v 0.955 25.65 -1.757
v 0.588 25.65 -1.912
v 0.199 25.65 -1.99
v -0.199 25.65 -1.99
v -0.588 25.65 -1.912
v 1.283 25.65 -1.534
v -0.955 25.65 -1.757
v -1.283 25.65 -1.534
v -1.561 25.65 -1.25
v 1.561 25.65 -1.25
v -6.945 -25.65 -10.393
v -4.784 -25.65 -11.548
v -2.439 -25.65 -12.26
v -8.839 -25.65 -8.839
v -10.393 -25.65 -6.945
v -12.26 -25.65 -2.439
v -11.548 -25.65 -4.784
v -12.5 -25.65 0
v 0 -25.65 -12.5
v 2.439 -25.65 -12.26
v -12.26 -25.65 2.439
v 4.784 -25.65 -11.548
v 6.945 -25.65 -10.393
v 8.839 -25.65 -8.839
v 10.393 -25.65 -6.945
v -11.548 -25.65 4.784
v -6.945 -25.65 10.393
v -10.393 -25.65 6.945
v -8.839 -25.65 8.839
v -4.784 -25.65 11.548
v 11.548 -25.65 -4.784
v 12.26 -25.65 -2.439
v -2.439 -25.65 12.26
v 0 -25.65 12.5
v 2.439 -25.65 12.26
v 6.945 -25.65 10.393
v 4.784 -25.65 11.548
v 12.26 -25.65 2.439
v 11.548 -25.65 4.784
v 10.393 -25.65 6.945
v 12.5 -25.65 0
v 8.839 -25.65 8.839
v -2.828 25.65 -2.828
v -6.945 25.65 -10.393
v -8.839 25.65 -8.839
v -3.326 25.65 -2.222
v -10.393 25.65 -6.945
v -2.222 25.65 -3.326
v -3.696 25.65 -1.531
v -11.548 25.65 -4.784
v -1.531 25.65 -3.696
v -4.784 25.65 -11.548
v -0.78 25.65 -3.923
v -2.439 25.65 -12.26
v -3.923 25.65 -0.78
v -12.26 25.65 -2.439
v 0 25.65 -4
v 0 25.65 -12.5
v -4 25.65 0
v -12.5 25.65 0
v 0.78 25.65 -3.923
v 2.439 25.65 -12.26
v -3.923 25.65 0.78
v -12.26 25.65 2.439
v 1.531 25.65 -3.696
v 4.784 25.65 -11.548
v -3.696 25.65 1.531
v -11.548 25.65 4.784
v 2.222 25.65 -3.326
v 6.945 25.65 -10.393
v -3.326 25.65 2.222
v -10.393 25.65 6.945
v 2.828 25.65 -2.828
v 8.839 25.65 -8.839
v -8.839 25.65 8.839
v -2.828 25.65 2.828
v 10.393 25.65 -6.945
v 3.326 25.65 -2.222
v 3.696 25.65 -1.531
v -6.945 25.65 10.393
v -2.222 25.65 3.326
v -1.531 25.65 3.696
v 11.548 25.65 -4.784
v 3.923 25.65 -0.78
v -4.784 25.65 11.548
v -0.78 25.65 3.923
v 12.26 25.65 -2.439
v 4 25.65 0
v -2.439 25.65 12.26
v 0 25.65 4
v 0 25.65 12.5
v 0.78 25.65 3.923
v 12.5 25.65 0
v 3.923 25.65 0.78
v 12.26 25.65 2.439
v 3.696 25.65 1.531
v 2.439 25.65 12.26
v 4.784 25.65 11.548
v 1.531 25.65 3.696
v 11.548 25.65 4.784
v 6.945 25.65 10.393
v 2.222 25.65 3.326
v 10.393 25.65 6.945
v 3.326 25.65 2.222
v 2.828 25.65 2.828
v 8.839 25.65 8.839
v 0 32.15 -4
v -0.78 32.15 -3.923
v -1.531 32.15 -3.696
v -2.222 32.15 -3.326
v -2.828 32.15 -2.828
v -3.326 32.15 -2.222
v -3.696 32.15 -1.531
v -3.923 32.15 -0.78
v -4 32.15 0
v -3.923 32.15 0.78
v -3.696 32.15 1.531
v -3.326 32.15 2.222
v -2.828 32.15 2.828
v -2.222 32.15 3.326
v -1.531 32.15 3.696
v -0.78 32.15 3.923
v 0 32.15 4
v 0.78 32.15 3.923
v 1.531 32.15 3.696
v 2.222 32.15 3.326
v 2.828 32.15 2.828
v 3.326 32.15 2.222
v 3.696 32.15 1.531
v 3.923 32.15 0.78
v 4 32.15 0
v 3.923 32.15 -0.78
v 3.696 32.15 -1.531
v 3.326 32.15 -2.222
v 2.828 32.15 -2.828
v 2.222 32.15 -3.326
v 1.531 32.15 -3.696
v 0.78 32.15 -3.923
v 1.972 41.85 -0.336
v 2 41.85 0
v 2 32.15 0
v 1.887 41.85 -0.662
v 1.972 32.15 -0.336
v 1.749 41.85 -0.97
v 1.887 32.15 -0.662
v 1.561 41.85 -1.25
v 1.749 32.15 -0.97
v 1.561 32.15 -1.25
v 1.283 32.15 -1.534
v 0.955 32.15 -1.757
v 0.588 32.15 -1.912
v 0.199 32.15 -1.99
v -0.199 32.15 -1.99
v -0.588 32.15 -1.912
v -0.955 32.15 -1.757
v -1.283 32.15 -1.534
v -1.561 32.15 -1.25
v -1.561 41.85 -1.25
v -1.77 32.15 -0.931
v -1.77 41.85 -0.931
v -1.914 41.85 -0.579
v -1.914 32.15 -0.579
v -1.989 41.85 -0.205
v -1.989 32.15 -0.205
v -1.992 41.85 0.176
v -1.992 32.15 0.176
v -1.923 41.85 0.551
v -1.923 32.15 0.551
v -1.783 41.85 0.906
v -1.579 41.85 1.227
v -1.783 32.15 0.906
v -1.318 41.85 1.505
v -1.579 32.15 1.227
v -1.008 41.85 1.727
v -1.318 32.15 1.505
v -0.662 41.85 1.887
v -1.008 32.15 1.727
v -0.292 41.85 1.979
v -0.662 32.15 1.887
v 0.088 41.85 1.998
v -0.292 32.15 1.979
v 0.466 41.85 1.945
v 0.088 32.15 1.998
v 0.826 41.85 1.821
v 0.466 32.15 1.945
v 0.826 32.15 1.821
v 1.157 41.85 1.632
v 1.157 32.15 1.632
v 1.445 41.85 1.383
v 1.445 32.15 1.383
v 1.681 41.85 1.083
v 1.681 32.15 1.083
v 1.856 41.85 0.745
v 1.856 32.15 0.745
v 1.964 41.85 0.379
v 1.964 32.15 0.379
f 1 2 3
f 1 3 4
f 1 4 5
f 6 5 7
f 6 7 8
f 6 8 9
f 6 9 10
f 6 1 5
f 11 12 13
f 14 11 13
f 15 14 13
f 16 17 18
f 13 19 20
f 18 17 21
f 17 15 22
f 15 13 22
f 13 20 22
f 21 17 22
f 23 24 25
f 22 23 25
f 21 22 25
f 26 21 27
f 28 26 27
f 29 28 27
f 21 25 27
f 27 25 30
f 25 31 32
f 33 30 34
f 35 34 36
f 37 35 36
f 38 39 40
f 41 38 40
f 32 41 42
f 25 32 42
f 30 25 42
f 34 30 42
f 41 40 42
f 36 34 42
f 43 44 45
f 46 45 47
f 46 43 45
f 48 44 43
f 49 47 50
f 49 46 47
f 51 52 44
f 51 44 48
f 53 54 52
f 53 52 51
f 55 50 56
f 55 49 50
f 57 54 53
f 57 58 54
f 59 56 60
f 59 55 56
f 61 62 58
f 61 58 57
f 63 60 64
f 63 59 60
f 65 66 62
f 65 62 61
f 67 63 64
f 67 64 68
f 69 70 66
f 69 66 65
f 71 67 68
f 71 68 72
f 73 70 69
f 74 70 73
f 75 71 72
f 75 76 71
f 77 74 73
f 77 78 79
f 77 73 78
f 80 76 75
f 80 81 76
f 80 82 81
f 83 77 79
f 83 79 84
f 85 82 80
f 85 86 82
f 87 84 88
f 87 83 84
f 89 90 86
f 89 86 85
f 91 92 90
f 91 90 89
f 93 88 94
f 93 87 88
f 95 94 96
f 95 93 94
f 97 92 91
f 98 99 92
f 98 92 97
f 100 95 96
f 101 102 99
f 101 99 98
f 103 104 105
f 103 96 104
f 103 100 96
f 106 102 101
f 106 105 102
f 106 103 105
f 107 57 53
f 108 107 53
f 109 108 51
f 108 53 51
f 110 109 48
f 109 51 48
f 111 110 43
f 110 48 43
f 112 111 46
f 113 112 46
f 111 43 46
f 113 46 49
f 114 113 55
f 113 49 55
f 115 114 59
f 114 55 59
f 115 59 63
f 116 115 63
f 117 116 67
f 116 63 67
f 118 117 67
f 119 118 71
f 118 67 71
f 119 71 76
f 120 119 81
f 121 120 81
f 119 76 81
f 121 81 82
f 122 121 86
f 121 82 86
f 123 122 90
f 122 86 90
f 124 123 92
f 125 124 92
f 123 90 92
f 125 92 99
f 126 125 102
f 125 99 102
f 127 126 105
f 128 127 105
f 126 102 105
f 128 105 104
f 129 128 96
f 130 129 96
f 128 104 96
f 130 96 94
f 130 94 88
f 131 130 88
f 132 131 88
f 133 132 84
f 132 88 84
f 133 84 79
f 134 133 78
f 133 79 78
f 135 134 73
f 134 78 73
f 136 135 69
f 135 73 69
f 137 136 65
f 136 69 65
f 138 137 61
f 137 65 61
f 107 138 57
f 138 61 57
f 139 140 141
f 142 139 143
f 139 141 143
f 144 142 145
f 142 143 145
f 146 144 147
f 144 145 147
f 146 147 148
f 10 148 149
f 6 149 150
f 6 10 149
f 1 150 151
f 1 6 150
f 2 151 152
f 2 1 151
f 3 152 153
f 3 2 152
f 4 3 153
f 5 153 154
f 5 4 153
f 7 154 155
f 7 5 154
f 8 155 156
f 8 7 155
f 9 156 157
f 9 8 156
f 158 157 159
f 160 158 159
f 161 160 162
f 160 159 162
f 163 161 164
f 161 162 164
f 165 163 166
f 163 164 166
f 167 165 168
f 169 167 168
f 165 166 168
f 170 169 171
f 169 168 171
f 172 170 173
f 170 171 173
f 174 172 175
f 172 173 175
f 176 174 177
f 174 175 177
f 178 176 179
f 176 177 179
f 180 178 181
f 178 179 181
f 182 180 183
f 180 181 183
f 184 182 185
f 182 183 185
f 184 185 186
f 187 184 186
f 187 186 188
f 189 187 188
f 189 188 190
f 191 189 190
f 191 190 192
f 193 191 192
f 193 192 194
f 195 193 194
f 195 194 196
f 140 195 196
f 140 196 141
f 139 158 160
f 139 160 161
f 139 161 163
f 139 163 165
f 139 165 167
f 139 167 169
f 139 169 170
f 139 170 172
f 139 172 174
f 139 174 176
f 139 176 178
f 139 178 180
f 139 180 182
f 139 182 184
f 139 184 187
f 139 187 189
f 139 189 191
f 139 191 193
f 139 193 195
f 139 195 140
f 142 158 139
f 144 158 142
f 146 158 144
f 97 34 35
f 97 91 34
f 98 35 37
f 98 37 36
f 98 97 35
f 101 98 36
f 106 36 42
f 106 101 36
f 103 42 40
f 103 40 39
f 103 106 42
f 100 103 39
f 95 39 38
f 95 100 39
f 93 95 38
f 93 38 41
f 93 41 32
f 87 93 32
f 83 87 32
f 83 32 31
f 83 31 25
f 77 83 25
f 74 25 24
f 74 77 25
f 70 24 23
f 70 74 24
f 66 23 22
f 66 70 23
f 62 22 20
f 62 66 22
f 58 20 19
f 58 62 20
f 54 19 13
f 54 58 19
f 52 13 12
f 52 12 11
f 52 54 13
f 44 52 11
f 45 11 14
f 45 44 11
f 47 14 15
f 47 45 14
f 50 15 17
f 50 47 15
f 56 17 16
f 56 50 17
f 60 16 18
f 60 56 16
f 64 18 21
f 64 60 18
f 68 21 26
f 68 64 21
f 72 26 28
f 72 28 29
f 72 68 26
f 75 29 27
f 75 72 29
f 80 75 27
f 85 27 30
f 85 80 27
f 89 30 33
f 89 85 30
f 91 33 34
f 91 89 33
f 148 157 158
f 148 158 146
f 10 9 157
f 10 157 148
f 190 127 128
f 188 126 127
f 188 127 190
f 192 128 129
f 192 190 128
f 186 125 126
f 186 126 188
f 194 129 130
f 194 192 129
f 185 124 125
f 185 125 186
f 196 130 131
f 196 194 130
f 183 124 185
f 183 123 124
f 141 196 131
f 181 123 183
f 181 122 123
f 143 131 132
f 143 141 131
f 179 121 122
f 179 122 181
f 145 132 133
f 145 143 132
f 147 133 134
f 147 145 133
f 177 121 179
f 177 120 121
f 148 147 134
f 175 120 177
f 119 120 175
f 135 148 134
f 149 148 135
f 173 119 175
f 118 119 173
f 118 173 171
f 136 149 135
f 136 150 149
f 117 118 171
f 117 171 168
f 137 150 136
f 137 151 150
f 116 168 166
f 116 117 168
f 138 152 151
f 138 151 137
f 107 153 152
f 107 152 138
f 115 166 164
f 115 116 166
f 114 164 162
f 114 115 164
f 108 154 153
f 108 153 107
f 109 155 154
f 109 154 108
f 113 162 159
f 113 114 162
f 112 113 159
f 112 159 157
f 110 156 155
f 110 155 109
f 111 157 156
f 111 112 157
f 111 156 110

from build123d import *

# Parameters (mm, degrees)
SKETCH1_R           = 12.5
BOSS_EXTRUDE1_DEPTH = 25.65
BOSS_EXTRUDE2_DEPTH = 16.2
SKETCH2_3_R         = 4
SKETCH2_3_R_2       = 2
BOSS_EXTRUDE3_DEPTH = 6.5
CUT_EXTRUDE2_DEPTH  = 17


with BuildPart() as part:
    # Sketch1 → Boss-Extrude1 (new, symmetric)
    with BuildSketch(Plane(origin=(0, 0, 0), x_dir=(1, 0, 0), z_dir=(0, 1, 0))):
        with Locations(Location((0, 0, 0), (0, 0, 270))):
            Circle(SKETCH1_R)
    extrude(amount=BOSS_EXTRUDE1_DEPTH, both=True)

    # Sketch2 → Boss-Extrude2 (add)
    with BuildSketch(Plane(origin=(0, 25.65, 0), x_dir=(1, 0, 0), z_dir=(0, 1, 0))):
        with BuildLine():
            ThreePointArc((1.5612495, 1.25), (0, 2), (-1.5612495, 1.25))
            Line((-1.5612495, 1.25), (1.5612495, 1.25))
        make_face()
        with BuildLine():
            Line((1.5612495, 1.25), (-1.5612495, 1.25))
            ThreePointArc((-1.5612495, 1.25), (-0.662382443, -1.887127314), (2, 0))
            ThreePointArc((2, 0), (1.887127314, 0.662382443), (1.5612495, 1.25))
        make_face()
    extrude(amount=BOSS_EXTRUDE2_DEPTH)

    # Sketch2<3> → Boss-Extrude3 (add)
    with BuildSketch(Plane(origin=(0, 25.65, 0), x_dir=(1, 0, 0), z_dir=(0, 1, 0))):
        with Locations(Location((0, 0, 0), (0, 0, 90))):
            Circle(SKETCH2_3_R)
        with Locations(Location((0, 0, 0), (0, 0, 270))):
            Circle(SKETCH2_3_R_2, mode=Mode.SUBTRACT)
    extrude(amount=BOSS_EXTRUDE3_DEPTH)

    # Sketch2<4> → Cut-Extrude2 (cut)
    with BuildSketch(Plane(origin=(0, 25.65, 0), x_dir=(1, 0, 0), z_dir=(0, 1, 0))):
        with BuildLine():
            ThreePointArc((1.5612495, 1.25), (0, 2), (-1.5612495, 1.25))
            Line((-1.5612495, 1.25), (1.5612495, 1.25))
        make_face()
    extrude(amount=CUT_EXTRUDE2_DEPTH, mode=Mode.SUBTRACT)


solid = part.part
